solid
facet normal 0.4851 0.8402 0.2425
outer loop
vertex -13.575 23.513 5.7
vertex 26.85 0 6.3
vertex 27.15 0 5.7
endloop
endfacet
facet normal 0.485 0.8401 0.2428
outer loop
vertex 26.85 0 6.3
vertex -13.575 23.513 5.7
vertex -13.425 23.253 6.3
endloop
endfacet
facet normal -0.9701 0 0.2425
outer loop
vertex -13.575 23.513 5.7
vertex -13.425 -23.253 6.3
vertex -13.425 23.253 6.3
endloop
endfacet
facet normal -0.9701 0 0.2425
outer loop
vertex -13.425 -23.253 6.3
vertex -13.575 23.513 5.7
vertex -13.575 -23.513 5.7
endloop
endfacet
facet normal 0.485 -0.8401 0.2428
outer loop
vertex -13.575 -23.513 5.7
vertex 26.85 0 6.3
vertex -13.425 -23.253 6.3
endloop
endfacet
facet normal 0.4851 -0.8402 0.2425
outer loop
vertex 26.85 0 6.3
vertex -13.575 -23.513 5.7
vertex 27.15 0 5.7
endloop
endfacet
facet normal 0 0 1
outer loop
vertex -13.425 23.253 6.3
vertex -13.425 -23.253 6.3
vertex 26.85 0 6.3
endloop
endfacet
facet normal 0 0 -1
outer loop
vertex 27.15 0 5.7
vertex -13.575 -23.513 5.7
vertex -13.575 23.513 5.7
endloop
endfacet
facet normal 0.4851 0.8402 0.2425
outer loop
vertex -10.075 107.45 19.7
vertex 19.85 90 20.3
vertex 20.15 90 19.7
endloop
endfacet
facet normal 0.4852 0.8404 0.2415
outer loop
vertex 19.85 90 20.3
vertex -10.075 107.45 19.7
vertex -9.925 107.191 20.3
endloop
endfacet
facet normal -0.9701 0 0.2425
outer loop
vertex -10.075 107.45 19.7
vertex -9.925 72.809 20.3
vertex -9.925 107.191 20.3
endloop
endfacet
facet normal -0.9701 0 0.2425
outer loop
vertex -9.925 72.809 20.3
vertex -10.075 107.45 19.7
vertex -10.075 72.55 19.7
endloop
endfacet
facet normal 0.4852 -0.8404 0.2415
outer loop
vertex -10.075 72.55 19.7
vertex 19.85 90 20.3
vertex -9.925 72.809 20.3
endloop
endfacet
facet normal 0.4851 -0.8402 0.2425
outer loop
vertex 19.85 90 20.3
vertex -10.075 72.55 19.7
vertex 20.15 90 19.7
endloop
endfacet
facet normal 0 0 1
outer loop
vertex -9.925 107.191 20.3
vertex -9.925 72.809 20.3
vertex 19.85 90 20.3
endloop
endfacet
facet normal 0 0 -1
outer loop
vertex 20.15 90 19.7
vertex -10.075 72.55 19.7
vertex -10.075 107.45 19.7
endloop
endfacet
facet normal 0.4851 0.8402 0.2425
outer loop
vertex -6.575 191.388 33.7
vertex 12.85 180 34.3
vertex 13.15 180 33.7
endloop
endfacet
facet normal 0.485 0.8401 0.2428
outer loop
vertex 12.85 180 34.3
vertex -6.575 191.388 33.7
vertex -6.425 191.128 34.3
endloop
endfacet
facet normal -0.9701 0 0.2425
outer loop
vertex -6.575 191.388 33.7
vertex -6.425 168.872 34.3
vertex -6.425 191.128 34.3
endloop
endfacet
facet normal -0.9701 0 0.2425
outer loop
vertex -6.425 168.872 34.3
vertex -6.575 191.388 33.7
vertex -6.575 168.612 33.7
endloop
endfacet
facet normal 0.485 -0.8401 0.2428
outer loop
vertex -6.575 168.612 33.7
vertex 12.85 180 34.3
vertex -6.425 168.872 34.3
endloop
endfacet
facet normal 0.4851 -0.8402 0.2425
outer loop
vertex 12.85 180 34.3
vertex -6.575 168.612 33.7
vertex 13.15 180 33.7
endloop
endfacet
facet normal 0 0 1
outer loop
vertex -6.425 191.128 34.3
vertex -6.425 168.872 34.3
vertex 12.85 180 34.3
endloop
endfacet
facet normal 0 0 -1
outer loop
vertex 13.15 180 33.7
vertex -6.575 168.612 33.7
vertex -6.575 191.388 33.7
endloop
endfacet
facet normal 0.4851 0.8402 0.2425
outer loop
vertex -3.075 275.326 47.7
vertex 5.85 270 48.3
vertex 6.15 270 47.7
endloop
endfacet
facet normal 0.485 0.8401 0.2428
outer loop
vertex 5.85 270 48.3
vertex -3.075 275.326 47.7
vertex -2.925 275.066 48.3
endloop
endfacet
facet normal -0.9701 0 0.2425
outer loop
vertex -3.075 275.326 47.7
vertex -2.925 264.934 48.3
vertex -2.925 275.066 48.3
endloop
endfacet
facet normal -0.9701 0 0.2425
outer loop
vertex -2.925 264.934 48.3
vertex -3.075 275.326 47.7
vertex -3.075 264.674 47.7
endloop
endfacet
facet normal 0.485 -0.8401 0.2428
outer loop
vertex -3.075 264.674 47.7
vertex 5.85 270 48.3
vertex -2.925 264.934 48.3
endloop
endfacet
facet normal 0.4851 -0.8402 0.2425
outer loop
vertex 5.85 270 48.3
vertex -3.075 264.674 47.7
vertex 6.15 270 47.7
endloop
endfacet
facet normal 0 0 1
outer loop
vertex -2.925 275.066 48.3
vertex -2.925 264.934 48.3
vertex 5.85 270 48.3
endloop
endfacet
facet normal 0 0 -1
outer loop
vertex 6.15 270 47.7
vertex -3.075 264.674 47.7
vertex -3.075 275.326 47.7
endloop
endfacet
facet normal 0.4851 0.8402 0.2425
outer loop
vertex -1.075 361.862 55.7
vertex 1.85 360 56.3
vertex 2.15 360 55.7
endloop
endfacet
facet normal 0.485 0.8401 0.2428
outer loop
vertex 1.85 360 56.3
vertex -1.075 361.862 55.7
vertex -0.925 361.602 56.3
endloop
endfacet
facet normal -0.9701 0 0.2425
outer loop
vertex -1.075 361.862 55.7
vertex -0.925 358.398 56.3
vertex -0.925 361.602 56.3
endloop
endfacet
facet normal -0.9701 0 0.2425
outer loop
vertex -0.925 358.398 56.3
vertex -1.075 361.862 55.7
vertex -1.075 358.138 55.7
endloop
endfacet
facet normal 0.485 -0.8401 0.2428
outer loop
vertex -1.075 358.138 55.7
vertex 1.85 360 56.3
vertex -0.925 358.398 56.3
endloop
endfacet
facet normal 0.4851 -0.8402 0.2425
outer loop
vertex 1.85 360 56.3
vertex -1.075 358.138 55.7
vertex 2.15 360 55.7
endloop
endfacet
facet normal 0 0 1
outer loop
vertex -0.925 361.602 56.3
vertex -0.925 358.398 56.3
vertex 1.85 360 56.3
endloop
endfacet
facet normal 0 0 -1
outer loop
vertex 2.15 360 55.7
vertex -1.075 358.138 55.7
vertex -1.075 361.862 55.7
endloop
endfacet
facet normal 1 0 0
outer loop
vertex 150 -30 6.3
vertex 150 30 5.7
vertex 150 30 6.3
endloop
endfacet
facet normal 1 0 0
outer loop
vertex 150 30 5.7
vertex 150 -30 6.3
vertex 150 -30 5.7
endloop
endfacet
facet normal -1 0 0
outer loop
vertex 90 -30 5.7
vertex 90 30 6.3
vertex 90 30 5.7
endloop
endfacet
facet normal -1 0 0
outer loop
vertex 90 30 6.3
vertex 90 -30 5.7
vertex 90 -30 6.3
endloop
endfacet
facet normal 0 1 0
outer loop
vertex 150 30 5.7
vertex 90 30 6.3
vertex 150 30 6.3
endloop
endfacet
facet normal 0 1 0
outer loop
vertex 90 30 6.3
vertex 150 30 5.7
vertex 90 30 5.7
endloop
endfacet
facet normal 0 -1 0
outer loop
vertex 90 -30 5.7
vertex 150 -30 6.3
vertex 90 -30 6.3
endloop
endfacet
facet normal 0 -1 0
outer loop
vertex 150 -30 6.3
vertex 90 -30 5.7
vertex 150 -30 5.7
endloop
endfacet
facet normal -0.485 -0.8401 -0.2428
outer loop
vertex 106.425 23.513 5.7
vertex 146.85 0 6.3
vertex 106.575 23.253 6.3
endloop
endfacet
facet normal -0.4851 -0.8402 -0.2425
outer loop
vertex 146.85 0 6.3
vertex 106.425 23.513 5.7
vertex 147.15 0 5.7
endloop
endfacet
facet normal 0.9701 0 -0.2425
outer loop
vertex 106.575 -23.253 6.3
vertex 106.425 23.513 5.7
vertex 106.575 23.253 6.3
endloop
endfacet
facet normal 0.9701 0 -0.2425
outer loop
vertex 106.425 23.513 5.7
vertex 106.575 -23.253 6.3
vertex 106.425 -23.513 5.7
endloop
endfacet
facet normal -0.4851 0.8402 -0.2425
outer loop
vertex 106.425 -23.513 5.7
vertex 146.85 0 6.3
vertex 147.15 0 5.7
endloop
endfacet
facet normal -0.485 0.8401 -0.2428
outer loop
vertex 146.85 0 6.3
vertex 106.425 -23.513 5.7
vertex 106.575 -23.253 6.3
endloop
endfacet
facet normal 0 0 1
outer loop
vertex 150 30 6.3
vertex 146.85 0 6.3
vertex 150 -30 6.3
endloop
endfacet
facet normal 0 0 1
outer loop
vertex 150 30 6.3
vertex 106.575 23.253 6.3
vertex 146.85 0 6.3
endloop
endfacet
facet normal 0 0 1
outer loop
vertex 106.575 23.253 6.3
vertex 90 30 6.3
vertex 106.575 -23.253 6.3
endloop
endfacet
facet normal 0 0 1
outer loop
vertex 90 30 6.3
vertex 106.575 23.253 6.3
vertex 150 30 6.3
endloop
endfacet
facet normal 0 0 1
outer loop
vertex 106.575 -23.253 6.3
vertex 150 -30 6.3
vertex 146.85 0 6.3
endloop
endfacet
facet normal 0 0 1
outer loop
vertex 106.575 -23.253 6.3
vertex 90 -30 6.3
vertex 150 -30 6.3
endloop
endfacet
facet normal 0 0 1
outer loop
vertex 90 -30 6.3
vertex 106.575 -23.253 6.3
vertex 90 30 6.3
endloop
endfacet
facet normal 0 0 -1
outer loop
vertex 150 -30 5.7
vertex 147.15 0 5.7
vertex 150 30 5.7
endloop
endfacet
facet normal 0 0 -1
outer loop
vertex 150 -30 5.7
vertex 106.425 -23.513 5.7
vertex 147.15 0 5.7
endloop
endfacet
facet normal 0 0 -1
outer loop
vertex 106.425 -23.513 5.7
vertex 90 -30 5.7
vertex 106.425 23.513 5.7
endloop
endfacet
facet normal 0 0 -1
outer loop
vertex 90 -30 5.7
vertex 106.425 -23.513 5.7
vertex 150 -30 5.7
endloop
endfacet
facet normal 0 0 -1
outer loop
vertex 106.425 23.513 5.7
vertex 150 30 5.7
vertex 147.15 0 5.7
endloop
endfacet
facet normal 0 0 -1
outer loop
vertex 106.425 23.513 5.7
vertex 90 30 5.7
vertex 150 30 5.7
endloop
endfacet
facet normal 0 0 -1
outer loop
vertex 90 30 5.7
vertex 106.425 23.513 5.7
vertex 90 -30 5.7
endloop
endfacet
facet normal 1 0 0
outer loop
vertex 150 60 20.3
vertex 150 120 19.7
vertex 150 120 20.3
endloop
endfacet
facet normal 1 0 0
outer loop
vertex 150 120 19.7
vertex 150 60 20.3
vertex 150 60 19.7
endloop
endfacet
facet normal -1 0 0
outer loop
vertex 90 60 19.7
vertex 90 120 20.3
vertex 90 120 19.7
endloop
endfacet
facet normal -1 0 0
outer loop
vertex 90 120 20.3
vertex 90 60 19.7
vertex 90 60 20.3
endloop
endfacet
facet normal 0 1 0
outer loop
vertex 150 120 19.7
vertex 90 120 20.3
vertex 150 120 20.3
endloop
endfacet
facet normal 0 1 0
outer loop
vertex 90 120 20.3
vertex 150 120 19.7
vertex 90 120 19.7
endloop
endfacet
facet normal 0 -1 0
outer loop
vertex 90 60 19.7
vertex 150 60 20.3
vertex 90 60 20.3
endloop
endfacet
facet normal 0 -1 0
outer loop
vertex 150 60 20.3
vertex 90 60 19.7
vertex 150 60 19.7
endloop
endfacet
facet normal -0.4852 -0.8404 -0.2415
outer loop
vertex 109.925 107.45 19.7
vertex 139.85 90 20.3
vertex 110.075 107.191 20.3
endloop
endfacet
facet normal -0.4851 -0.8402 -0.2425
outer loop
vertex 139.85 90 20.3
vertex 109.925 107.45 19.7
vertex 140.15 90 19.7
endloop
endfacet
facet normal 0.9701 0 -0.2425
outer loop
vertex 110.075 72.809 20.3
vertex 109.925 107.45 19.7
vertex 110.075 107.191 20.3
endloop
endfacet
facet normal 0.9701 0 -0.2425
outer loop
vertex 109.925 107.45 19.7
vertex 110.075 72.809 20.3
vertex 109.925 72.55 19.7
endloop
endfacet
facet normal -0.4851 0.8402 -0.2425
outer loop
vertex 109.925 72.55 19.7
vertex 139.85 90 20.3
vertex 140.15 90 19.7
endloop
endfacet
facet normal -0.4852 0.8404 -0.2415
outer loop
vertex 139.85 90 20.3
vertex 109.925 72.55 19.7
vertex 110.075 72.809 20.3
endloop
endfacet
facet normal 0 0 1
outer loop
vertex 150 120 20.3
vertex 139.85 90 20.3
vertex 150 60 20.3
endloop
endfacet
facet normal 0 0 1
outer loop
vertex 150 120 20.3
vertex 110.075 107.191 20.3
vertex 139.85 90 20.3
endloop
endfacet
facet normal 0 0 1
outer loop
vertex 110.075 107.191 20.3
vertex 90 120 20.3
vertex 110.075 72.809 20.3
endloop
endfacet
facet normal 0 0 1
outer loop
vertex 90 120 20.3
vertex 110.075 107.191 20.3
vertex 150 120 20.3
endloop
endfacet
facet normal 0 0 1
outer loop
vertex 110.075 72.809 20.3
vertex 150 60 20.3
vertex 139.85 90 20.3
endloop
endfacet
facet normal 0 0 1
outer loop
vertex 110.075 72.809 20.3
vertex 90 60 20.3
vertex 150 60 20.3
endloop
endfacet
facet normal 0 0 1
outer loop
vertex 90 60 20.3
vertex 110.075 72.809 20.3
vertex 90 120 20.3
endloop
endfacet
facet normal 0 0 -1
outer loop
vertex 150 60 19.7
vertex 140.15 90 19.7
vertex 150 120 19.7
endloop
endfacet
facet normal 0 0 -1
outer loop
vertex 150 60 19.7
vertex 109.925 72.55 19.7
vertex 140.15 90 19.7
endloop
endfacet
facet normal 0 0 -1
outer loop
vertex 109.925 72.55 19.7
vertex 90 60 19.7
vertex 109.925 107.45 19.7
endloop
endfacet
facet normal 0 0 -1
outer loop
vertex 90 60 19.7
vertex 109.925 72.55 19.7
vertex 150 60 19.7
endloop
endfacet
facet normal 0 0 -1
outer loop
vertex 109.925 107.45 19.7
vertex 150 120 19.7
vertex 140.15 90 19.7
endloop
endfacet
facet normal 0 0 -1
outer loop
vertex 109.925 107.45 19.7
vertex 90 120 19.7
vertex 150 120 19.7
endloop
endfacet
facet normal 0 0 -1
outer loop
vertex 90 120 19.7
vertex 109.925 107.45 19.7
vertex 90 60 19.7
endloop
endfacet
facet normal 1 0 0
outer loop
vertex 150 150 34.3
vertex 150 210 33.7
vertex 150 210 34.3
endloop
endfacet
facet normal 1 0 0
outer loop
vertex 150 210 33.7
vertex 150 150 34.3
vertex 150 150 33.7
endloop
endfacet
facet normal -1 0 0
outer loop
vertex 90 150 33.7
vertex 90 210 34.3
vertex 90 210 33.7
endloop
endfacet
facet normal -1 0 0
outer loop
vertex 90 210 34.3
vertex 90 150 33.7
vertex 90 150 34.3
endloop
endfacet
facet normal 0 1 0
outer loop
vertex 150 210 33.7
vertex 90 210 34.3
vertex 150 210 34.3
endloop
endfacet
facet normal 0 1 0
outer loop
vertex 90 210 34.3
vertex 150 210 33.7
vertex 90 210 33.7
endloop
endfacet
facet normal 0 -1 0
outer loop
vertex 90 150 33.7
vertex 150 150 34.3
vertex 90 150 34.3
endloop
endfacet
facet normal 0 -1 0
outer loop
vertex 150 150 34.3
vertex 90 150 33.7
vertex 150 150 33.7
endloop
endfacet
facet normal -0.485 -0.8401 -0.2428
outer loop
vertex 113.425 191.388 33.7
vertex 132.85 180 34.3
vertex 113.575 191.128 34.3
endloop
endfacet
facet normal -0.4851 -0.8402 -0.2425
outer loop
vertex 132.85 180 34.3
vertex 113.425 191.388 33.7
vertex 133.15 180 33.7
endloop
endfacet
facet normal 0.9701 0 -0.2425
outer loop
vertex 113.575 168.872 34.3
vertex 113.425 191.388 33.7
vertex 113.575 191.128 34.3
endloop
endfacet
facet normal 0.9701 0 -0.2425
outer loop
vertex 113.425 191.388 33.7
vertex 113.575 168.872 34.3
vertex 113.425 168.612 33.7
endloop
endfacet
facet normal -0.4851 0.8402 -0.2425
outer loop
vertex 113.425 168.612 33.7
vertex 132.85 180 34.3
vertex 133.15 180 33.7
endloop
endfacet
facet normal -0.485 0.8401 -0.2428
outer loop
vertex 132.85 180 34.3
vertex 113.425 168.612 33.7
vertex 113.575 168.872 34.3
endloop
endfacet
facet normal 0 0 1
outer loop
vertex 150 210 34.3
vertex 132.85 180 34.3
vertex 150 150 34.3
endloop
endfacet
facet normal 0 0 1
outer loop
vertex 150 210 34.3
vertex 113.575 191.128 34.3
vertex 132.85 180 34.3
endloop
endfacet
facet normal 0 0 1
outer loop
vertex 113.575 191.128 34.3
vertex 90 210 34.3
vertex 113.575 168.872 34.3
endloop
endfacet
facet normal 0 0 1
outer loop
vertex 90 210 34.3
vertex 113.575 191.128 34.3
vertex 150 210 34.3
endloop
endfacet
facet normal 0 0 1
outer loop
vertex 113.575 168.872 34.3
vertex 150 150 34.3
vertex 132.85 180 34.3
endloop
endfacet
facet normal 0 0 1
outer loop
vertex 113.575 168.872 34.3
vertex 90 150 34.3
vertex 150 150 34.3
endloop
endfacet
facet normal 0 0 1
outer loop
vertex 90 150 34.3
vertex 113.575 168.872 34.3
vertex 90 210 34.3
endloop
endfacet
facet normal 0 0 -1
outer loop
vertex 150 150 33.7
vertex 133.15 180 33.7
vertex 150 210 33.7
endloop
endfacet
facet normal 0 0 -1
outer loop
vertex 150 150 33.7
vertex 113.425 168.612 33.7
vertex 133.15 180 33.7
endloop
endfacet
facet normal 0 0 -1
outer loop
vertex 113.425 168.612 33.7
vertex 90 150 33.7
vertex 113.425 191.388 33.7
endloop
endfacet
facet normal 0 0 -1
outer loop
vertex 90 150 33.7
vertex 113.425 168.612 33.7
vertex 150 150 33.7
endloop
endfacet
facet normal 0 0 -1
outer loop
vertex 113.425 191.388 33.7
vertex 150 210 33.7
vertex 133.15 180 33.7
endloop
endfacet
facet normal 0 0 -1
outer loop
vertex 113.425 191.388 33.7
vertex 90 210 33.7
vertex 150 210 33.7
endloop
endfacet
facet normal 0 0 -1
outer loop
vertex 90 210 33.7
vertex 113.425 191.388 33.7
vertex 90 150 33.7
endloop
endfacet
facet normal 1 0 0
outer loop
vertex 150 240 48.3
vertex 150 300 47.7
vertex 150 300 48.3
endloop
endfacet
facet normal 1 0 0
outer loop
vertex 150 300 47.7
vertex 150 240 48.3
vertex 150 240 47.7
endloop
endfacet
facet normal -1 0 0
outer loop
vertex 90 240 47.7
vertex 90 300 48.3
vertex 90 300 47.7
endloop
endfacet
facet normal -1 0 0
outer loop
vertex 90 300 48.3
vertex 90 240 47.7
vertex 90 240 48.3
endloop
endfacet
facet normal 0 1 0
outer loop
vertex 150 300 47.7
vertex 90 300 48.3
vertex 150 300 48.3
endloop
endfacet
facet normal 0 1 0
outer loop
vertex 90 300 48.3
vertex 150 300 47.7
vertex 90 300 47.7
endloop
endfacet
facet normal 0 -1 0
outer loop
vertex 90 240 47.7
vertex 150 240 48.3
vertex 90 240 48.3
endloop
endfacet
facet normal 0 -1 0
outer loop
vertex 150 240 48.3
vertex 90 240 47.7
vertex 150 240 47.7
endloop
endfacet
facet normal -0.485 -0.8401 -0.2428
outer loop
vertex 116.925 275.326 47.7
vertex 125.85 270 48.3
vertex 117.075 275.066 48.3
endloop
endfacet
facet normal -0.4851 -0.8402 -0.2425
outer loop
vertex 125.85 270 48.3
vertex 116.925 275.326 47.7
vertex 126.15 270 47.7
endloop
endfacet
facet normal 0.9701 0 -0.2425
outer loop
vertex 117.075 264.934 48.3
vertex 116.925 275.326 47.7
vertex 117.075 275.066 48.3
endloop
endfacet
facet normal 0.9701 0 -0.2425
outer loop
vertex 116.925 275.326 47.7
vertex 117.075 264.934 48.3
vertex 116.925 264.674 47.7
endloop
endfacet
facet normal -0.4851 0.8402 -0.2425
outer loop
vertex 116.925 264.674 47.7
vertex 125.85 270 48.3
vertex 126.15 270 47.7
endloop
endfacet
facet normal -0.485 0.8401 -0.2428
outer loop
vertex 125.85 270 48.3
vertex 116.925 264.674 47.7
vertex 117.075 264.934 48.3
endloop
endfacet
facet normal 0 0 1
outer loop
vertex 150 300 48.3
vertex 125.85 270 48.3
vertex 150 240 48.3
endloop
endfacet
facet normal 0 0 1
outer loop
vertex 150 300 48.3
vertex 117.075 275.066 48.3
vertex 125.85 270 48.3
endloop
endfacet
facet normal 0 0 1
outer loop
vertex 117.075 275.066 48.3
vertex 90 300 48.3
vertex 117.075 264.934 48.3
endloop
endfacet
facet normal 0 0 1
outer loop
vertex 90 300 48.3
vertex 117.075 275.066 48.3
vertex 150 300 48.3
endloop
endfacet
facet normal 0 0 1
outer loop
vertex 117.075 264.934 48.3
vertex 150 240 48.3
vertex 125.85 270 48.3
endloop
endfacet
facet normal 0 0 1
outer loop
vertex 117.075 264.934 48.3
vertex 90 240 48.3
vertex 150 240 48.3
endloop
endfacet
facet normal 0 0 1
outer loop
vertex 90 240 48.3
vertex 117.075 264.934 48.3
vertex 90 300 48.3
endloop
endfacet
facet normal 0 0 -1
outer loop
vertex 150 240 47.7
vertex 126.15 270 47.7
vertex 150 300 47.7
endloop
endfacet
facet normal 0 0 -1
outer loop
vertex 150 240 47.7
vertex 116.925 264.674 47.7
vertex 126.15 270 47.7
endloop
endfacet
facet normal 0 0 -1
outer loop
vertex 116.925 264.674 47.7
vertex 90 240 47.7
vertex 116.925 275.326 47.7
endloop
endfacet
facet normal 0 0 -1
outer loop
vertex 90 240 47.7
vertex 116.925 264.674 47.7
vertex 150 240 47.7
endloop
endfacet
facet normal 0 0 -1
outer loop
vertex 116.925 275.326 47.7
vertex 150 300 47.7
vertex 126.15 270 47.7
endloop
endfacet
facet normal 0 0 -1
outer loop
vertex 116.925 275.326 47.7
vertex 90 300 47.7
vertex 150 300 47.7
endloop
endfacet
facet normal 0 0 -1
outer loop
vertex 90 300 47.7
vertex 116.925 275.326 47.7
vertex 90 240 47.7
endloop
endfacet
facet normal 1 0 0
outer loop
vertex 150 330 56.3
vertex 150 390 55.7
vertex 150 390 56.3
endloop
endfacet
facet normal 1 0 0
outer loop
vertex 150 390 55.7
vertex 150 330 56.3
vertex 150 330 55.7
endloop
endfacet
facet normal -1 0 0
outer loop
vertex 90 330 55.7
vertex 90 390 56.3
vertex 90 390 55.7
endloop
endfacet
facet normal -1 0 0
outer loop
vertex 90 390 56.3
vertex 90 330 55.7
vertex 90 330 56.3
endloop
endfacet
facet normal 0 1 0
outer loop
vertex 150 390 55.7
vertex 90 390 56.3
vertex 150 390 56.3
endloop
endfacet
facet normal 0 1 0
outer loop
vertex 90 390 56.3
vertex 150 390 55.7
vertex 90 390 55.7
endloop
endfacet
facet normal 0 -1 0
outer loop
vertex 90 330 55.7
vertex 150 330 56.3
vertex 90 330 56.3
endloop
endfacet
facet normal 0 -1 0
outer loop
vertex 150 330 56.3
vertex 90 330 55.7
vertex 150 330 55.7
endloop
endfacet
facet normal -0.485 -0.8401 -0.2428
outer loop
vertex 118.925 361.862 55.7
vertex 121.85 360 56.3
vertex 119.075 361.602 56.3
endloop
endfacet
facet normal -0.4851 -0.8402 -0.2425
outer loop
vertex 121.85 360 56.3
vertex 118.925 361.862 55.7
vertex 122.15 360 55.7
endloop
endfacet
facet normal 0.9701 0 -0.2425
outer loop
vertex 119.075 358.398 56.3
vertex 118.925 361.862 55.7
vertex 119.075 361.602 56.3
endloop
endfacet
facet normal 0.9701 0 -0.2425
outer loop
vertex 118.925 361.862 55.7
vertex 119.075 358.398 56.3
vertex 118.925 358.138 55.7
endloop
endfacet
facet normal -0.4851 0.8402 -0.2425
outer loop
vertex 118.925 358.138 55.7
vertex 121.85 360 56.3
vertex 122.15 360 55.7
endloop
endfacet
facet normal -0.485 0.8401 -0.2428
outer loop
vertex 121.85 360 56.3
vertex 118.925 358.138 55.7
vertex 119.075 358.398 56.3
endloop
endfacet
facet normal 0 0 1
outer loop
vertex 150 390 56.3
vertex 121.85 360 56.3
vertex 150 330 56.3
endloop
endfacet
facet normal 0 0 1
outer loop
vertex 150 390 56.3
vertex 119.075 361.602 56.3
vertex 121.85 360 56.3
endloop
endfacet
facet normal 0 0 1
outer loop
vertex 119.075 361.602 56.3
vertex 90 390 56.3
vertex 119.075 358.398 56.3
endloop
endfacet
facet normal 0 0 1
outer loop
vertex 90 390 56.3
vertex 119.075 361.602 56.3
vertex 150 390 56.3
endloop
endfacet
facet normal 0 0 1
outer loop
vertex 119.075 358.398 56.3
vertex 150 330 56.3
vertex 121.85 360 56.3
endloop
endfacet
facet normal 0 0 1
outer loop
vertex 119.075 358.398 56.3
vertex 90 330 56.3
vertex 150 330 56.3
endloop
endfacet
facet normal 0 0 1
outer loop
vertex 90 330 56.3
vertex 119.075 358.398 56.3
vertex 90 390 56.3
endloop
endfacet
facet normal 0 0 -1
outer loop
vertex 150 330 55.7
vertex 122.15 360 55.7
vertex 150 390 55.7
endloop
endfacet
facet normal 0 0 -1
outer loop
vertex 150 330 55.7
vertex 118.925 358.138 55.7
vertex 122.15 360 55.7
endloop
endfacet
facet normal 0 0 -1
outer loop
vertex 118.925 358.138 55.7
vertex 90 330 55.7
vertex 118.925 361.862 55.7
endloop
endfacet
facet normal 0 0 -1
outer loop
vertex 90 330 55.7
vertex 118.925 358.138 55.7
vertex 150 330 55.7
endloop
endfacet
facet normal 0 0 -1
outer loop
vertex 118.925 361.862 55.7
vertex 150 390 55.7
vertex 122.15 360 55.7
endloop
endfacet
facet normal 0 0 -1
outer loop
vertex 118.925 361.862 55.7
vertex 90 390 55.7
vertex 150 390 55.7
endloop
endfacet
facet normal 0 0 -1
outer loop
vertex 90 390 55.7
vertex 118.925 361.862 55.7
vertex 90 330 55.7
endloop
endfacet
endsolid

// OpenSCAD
// file: _fillet_ref.scad
// -----------------------------------------------------------------------------
// M1 visual harness — shared reference tools + cross-cut viewer
//
// These are HAND-WRITTEN reference fillet/round/chamfer tools built from the
// classic OpenSCAD idioms (annulus - torus, wedge - cylinder, ...). They do NOT
// depend on the fillet_tool/round_tool nodes, so they render today and give the
// known-good target that later milestones (M5, M7) must reproduce.
//
// Convention for every case: geometry is built so the feature EDGE runs along Z,
// and we take a thin-slab horizontal cross-section (normal +Z). One image then
// shows, side by side along X:
//     [ base model ] [ applied result ] [ isolated tool solid ]
// and, stacked along Y, a small radius and a large radius (>= surface extent).
// -----------------------------------------------------------------------------

// Thin-slab section: intersect children with a thin horizontal slab at height z.
// XY size is deliberately huge so it covers the whole laid-out scene; only z and
// thickness matter for what the section shows.
module fillet_section(z = 0, thickness = 0.6, extent = 4000) {
  intersection() {
    children();
    translate([0, 0, z]) cube([extent, extent, thickness], center = true);
  }
}

// Vertical thin-slab section (normal +Y), for axis-symmetric ring features where
// a cut through the axis shows the rho-z profile and the ring fillet on both sides.
module fillet_vsection(y = 0, thickness = 0.6, extent = 4000) {
  intersection() {
    children();
    translate([0, y, 0]) cube([extent, thickness, extent], center = true);
  }
}

// Stack several thin-slab sections at different heights, translated apart along
// +Y so the section EVOLVING toward a junction is visible at a glance (used for
// the 3-/4-face meeting-point cases).
module fillet_contour_stack(zs, thickness = 0.6, spacing = 90, extent = 4000) {
  for (i = [0 : len(zs) - 1])
    translate([0, i * spacing, 0])
      fillet_section(z = zs[i], thickness = thickness, extent = extent)
        children();
}

// ---- reference tools for a single 90-degree edge running along Z -------------

// Inner (concave) fillet bead. Faces are x = cx (material x < cx) and y = cy
// (material y < cy); the reentrant quadrant opens toward +x,+y. Union this with
// the model. Cross-section = corner square minus a quarter disc (= a fillet).
module ref_fillet_edge_z(cx, cy, r, h, z0 = 0) {
  translate([0, 0, z0])
    difference() {
      translate([cx, cy, 0]) cube([r, r, h]);
      translate([cx + r, cy + r, -1]) cylinder(r = r, h = h + 2);
    }
}

// Outer (convex) round tool. Convex corner at (cx,cy), material x < cx & y < cy.
// SUBTRACT this from the model; it is the sharp corner sliver outside the arc.
module ref_round_edge_z(cx, cy, r, h, z0 = 0) {
  translate([0, 0, z0])
    difference() {
      translate([cx - r, cy - r, 0]) cube([r, r, h]);
      translate([cx - r, cy - r, -1]) cylinder(r = r, h = h + 2);
    }
}

// Inner (concave) chamfer bead — the wedge alone, no arc. Union with the model.
module ref_chamfer_edge_z(cx, cy, t, h, z0 = 0) {
  translate([0, 0, z0])
    linear_extrude(h)
      polygon([[cx, cy], [cx + t, cy], [cx, cy + t]]);
}
// main file
// Case D — 3-face meeting point via a low-$fn cone ($fn = 3 -> triangular apex).
// Two forms:
//   left  column: the cone itself      -> CONVEX 3-face junction (round_tool)
//   right column: cube minus the cone  -> CONCAVE 3-face pocket   (fillet_tool)
//
// There is NO hand-written reference blend here on purpose: the equal-radius
// trihedral corner (plan §6.3) has no simple closed form — building it correctly
// is exactly what milestone M8 is for. This file exists to VISUALISE the section
// evolving toward the meeting point, so M8's output can later be dropped into the
// same contour stack and checked at a glance.
//
// Each column is a CONTOUR STACK: thin-slab sections at rising z, laid out along
// +Y, so one image shows the section collapse toward the apex.

include <_fillet_ref.scad>;

$fn = 3;            // 3-face apex

R  = 30;            // cone base radius
Hc = 60;           // cone height
zs = [6, 20, 34, 48, 56];   // section heights, marching toward the apex

module cone_up() { cylinder(r1 = R, r2 = 0, h = Hc); }   // convex apex at top

module pocket() {                                          // concave 3-face pit
  difference() {
    translate([-R, -R, 0]) cube([2 * R, 2 * R, Hc]);
    cone_up();
  }
}

// convex apex (round_tool target)
fillet_contour_stack(zs) cone_up();

// concave pocket (fillet_tool target)
translate([120, 0, 0]) fillet_contour_stack(zs) pocket();
